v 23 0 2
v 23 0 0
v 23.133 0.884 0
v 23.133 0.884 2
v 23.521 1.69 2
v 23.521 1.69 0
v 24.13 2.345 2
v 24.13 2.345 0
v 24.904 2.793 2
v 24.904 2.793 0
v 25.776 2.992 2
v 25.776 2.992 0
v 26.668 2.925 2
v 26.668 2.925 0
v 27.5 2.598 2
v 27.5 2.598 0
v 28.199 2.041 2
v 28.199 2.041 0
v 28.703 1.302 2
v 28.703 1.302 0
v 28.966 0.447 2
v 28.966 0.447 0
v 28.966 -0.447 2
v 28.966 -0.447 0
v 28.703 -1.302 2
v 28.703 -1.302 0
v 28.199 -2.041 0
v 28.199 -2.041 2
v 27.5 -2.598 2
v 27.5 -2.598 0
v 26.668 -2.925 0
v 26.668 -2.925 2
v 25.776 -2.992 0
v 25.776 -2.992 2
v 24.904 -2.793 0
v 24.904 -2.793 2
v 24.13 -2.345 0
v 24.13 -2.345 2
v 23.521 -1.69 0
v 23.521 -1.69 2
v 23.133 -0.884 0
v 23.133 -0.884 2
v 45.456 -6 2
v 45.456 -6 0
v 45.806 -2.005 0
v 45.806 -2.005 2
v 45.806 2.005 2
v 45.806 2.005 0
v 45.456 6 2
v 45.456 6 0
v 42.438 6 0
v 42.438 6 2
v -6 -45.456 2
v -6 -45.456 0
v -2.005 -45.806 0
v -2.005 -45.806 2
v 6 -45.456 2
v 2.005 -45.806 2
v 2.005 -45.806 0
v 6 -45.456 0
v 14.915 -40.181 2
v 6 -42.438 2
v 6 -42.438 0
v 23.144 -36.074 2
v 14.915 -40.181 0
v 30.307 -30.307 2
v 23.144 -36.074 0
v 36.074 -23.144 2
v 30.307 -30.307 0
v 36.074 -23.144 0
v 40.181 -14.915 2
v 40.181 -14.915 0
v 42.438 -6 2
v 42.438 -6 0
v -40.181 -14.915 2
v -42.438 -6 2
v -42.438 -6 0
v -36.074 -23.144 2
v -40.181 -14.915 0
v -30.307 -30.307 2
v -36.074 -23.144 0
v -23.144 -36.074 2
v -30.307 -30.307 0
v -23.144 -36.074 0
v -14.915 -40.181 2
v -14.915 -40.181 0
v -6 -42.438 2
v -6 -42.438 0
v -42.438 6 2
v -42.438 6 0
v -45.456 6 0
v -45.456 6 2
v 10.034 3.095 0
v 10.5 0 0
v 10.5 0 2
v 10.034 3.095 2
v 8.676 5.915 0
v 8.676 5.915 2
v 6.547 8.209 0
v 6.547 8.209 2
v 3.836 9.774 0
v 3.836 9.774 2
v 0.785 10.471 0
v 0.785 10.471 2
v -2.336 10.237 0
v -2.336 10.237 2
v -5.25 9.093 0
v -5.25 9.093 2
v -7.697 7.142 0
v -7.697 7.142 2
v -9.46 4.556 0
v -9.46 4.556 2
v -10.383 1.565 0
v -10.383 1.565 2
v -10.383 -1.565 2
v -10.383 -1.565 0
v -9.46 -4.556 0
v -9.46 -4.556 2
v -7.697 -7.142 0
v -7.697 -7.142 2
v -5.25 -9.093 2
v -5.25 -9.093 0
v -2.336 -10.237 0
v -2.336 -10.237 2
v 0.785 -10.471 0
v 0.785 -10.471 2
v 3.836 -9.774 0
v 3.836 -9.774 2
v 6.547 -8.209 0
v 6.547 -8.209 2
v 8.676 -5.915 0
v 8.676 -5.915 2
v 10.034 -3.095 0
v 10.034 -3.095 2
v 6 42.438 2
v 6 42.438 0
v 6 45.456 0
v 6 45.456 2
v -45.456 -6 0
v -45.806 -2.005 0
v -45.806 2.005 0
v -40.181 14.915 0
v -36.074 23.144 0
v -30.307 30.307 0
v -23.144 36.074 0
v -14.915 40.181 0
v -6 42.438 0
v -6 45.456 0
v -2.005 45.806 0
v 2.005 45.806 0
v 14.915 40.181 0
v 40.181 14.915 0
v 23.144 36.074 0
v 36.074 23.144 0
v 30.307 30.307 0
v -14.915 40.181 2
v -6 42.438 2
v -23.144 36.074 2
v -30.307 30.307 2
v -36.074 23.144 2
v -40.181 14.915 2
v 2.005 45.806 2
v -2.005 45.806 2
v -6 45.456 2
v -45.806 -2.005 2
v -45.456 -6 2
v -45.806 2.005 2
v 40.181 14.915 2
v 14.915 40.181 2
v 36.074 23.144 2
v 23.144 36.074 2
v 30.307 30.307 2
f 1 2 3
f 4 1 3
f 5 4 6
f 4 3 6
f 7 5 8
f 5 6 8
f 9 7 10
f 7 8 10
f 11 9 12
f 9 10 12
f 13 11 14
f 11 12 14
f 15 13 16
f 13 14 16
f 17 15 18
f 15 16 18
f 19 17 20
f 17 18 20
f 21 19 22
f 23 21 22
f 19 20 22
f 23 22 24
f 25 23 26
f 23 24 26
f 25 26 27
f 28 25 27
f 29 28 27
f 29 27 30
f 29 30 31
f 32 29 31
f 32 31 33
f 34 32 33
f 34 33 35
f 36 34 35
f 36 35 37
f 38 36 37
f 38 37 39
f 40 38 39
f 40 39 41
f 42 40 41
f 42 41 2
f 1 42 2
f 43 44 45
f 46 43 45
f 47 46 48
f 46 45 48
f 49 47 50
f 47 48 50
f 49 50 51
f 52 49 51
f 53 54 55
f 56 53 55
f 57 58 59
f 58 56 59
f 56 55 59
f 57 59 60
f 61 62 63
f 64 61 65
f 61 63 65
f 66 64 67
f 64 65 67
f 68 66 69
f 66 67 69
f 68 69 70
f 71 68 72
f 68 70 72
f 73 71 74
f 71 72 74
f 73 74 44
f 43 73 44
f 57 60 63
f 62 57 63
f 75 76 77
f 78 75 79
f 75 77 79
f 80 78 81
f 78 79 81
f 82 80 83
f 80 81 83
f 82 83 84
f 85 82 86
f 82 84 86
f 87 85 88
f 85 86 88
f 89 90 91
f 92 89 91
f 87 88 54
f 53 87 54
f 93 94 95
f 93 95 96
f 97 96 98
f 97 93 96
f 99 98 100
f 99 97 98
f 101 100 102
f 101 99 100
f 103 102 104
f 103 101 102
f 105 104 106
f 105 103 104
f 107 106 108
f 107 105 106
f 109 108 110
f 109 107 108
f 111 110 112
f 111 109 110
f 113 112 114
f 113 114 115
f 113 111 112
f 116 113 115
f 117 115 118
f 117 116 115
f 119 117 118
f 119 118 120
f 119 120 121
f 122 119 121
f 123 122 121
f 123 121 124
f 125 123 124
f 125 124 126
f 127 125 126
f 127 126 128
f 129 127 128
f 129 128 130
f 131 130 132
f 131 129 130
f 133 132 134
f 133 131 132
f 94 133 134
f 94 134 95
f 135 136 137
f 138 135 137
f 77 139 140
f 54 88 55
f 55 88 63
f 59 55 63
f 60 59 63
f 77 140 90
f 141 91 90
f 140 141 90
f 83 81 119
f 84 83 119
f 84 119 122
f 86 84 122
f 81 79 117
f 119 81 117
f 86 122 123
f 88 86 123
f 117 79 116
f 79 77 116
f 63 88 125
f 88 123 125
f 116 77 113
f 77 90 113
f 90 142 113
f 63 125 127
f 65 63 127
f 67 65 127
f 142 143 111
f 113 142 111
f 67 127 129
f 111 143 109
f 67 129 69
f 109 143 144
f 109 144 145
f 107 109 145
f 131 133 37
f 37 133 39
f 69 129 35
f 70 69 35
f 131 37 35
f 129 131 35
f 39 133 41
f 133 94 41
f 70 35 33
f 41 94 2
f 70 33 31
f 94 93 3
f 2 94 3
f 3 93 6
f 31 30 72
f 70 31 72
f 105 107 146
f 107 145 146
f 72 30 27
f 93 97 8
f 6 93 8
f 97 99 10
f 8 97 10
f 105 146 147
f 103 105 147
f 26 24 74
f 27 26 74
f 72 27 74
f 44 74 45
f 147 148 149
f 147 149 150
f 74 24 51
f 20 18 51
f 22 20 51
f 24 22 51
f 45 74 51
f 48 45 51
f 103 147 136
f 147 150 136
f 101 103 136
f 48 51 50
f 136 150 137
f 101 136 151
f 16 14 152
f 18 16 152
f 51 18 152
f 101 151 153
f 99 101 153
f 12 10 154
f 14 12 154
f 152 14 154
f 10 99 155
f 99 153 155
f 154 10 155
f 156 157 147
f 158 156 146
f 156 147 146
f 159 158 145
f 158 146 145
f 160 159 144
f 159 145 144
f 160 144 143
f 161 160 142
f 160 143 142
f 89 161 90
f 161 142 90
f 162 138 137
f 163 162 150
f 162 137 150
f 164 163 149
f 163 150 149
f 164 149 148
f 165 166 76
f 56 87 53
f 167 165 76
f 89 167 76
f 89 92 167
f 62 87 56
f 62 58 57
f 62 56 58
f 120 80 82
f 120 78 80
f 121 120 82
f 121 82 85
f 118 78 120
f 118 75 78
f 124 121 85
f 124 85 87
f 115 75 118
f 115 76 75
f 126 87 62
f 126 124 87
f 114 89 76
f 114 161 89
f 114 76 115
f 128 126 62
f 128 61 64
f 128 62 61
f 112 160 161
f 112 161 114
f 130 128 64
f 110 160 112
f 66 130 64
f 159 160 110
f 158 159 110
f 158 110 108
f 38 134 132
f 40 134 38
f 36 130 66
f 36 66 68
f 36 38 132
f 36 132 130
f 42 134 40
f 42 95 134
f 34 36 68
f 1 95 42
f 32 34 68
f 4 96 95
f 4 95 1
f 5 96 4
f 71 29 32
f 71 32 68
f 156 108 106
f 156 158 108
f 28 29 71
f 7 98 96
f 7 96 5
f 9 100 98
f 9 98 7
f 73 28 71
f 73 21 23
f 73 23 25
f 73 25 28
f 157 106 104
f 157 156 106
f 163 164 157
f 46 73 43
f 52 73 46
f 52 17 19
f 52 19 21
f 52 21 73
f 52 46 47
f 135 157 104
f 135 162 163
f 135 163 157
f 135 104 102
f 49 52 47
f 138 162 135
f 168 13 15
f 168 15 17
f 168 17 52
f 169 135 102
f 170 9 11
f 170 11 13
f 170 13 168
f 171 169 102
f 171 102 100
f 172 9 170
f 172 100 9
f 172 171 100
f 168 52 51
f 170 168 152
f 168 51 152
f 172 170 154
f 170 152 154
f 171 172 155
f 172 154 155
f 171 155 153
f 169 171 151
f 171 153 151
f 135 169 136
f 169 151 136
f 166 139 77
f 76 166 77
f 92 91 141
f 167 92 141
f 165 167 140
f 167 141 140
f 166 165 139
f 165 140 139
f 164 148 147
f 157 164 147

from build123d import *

# Parameters (mm, degrees)
SKETCH1_R           = 45.85
SKETCH1_R_2         = 10.5
BOSS_EXTRUDE1_DEPTH = 2
CUT_EXTRUDE1_REACH  = 4
SKETCH2_R           = 3
CUT_EXTRUDE2_REACH  = 4


with BuildPart() as part:
    # Sketch1 → Boss-Extrude1 (new body)
    with BuildSketch(Plane.XY):
        Circle(SKETCH1_R)
        Circle(SKETCH1_R_2, mode=Mode.SUBTRACT)
    extrude(amount=BOSS_EXTRUDE1_DEPTH)

    # Sketch2 → Cut-Extrude1 (cut, up to next)
    with BuildSketch(Plane(origin=(0, 0, 0), x_dir=(-1, 0, 0), z_dir=(0, 0, -1)), mode=Mode.PRIVATE) as cut_extrude1_sk1:
        with Locations((-26, 0)):
            Circle(SKETCH2_R)
    cut_extrude1_tool1 = extrude(cut_extrude1_sk1.sketch, amount=-CUT_EXTRUDE1_REACH, mode=Mode.PRIVATE) & part.part
    add(cut_extrude1_tool1.solids().sort_by_distance((26, 0, 0))[0], mode=Mode.SUBTRACT)

    # Sketch3 → Cut-Extrude2 (cut, up to next)
    with BuildSketch(Plane(origin=(0, 0, 0), x_dir=(-1, 0, 0), z_dir=(0, 0, -1)), mode=Mode.PRIVATE) as cut_extrude2_sk1:
        with BuildLine():
            Line((-6, 42.437949998), (-6, 45.455720212))
            ThreePointArc((-6, 45.455720212), (-32.420845917, 32.420845917), (-45.455720212, 6))
            Line((-45.455720212, 6), (-42.437949998, 6))
            ThreePointArc((-42.437949998, 6), (-30.306596642, 30.306596642), (-6, 42.437949998))
        make_face()
    cut_extrude2_tool1 = extrude(cut_extrude2_sk1.sketch, amount=-CUT_EXTRUDE2_REACH, mode=Mode.PRIVATE) & part.part
    add(cut_extrude2_tool1.solids().sort_by_distance((6.557988, 43.946835, 0))[0], mode=Mode.SUBTRACT)
    # Sketch3 → Cut-Extrude2 (cut, up to next)
    with BuildSketch(Plane(origin=(0, 0, 0), x_dir=(-1, 0, 0), z_dir=(0, 0, -1)), mode=Mode.PRIVATE) as cut_extrude2_sk2:
        with BuildLine():
            Line((42.437949998, 6), (45.455720212, 6))
            ThreePointArc((45.455720212, 6), (32.420845917, 32.420845917), (6, 45.455720212))
            Line((6, 45.455720212), (6, 42.437949998))
            ThreePointArc((6, 42.437949998), (30.306596642, 30.306596642), (42.437949998, 6))
        make_face()
    cut_extrude2_tool2 = extrude(cut_extrude2_sk2.sketch, amount=-CUT_EXTRUDE2_REACH, mode=Mode.PRIVATE) & part.part
    add(cut_extrude2_tool2.solids().sort_by_distance((-43.946835, 6.557988, 0))[0], mode=Mode.SUBTRACT)
    # Sketch3 → Cut-Extrude2 (cut, up to next)
    with BuildSketch(Plane(origin=(0, 0, 0), x_dir=(-1, 0, 0), z_dir=(0, 0, -1)), mode=Mode.PRIVATE) as cut_extrude2_sk3:
        with BuildLine():
            Line((6, -42.437949998), (6, -45.455720212))
            ThreePointArc((6, -45.455720212), (32.420845917, -32.420845917), (45.455720212, -6))
            Line((45.455720212, -6), (42.437949998, -6))
            ThreePointArc((42.437949998, -6), (30.306596642, -30.306596642), (6, -42.437949998))
        make_face()
    cut_extrude2_tool3 = extrude(cut_extrude2_sk3.sketch, amount=-CUT_EXTRUDE2_REACH, mode=Mode.PRIVATE) & part.part
    add(cut_extrude2_tool3.solids().sort_by_distance((-32.026289, -32.026289, 0))[0], mode=Mode.SUBTRACT)
    # Sketch3 → Cut-Extrude2 (cut, up to next)
    with BuildSketch(Plane(origin=(0, 0, 0), x_dir=(-1, 0, 0), z_dir=(0, 0, -1)), mode=Mode.PRIVATE) as cut_extrude2_sk4:
        with BuildLine():
            Line((-42.437949998, -6), (-45.455720212, -6))
            ThreePointArc((-45.455720212, -6), (-32.420845917, -32.420845917), (-6, -45.455720212))
            Line((-6, -45.455720212), (-6, -42.437949998))
            ThreePointArc((-6, -42.437949998), (-30.306596642, -30.306596642), (-42.437949998, -6))
        make_face()
    cut_extrude2_tool4 = extrude(cut_extrude2_sk4.sketch, amount=-CUT_EXTRUDE2_REACH, mode=Mode.PRIVATE) & part.part
    add(cut_extrude2_tool4.solids().sort_by_distance((6.557988, -43.946835, 0))[0], mode=Mode.SUBTRACT)


solid = part.part
